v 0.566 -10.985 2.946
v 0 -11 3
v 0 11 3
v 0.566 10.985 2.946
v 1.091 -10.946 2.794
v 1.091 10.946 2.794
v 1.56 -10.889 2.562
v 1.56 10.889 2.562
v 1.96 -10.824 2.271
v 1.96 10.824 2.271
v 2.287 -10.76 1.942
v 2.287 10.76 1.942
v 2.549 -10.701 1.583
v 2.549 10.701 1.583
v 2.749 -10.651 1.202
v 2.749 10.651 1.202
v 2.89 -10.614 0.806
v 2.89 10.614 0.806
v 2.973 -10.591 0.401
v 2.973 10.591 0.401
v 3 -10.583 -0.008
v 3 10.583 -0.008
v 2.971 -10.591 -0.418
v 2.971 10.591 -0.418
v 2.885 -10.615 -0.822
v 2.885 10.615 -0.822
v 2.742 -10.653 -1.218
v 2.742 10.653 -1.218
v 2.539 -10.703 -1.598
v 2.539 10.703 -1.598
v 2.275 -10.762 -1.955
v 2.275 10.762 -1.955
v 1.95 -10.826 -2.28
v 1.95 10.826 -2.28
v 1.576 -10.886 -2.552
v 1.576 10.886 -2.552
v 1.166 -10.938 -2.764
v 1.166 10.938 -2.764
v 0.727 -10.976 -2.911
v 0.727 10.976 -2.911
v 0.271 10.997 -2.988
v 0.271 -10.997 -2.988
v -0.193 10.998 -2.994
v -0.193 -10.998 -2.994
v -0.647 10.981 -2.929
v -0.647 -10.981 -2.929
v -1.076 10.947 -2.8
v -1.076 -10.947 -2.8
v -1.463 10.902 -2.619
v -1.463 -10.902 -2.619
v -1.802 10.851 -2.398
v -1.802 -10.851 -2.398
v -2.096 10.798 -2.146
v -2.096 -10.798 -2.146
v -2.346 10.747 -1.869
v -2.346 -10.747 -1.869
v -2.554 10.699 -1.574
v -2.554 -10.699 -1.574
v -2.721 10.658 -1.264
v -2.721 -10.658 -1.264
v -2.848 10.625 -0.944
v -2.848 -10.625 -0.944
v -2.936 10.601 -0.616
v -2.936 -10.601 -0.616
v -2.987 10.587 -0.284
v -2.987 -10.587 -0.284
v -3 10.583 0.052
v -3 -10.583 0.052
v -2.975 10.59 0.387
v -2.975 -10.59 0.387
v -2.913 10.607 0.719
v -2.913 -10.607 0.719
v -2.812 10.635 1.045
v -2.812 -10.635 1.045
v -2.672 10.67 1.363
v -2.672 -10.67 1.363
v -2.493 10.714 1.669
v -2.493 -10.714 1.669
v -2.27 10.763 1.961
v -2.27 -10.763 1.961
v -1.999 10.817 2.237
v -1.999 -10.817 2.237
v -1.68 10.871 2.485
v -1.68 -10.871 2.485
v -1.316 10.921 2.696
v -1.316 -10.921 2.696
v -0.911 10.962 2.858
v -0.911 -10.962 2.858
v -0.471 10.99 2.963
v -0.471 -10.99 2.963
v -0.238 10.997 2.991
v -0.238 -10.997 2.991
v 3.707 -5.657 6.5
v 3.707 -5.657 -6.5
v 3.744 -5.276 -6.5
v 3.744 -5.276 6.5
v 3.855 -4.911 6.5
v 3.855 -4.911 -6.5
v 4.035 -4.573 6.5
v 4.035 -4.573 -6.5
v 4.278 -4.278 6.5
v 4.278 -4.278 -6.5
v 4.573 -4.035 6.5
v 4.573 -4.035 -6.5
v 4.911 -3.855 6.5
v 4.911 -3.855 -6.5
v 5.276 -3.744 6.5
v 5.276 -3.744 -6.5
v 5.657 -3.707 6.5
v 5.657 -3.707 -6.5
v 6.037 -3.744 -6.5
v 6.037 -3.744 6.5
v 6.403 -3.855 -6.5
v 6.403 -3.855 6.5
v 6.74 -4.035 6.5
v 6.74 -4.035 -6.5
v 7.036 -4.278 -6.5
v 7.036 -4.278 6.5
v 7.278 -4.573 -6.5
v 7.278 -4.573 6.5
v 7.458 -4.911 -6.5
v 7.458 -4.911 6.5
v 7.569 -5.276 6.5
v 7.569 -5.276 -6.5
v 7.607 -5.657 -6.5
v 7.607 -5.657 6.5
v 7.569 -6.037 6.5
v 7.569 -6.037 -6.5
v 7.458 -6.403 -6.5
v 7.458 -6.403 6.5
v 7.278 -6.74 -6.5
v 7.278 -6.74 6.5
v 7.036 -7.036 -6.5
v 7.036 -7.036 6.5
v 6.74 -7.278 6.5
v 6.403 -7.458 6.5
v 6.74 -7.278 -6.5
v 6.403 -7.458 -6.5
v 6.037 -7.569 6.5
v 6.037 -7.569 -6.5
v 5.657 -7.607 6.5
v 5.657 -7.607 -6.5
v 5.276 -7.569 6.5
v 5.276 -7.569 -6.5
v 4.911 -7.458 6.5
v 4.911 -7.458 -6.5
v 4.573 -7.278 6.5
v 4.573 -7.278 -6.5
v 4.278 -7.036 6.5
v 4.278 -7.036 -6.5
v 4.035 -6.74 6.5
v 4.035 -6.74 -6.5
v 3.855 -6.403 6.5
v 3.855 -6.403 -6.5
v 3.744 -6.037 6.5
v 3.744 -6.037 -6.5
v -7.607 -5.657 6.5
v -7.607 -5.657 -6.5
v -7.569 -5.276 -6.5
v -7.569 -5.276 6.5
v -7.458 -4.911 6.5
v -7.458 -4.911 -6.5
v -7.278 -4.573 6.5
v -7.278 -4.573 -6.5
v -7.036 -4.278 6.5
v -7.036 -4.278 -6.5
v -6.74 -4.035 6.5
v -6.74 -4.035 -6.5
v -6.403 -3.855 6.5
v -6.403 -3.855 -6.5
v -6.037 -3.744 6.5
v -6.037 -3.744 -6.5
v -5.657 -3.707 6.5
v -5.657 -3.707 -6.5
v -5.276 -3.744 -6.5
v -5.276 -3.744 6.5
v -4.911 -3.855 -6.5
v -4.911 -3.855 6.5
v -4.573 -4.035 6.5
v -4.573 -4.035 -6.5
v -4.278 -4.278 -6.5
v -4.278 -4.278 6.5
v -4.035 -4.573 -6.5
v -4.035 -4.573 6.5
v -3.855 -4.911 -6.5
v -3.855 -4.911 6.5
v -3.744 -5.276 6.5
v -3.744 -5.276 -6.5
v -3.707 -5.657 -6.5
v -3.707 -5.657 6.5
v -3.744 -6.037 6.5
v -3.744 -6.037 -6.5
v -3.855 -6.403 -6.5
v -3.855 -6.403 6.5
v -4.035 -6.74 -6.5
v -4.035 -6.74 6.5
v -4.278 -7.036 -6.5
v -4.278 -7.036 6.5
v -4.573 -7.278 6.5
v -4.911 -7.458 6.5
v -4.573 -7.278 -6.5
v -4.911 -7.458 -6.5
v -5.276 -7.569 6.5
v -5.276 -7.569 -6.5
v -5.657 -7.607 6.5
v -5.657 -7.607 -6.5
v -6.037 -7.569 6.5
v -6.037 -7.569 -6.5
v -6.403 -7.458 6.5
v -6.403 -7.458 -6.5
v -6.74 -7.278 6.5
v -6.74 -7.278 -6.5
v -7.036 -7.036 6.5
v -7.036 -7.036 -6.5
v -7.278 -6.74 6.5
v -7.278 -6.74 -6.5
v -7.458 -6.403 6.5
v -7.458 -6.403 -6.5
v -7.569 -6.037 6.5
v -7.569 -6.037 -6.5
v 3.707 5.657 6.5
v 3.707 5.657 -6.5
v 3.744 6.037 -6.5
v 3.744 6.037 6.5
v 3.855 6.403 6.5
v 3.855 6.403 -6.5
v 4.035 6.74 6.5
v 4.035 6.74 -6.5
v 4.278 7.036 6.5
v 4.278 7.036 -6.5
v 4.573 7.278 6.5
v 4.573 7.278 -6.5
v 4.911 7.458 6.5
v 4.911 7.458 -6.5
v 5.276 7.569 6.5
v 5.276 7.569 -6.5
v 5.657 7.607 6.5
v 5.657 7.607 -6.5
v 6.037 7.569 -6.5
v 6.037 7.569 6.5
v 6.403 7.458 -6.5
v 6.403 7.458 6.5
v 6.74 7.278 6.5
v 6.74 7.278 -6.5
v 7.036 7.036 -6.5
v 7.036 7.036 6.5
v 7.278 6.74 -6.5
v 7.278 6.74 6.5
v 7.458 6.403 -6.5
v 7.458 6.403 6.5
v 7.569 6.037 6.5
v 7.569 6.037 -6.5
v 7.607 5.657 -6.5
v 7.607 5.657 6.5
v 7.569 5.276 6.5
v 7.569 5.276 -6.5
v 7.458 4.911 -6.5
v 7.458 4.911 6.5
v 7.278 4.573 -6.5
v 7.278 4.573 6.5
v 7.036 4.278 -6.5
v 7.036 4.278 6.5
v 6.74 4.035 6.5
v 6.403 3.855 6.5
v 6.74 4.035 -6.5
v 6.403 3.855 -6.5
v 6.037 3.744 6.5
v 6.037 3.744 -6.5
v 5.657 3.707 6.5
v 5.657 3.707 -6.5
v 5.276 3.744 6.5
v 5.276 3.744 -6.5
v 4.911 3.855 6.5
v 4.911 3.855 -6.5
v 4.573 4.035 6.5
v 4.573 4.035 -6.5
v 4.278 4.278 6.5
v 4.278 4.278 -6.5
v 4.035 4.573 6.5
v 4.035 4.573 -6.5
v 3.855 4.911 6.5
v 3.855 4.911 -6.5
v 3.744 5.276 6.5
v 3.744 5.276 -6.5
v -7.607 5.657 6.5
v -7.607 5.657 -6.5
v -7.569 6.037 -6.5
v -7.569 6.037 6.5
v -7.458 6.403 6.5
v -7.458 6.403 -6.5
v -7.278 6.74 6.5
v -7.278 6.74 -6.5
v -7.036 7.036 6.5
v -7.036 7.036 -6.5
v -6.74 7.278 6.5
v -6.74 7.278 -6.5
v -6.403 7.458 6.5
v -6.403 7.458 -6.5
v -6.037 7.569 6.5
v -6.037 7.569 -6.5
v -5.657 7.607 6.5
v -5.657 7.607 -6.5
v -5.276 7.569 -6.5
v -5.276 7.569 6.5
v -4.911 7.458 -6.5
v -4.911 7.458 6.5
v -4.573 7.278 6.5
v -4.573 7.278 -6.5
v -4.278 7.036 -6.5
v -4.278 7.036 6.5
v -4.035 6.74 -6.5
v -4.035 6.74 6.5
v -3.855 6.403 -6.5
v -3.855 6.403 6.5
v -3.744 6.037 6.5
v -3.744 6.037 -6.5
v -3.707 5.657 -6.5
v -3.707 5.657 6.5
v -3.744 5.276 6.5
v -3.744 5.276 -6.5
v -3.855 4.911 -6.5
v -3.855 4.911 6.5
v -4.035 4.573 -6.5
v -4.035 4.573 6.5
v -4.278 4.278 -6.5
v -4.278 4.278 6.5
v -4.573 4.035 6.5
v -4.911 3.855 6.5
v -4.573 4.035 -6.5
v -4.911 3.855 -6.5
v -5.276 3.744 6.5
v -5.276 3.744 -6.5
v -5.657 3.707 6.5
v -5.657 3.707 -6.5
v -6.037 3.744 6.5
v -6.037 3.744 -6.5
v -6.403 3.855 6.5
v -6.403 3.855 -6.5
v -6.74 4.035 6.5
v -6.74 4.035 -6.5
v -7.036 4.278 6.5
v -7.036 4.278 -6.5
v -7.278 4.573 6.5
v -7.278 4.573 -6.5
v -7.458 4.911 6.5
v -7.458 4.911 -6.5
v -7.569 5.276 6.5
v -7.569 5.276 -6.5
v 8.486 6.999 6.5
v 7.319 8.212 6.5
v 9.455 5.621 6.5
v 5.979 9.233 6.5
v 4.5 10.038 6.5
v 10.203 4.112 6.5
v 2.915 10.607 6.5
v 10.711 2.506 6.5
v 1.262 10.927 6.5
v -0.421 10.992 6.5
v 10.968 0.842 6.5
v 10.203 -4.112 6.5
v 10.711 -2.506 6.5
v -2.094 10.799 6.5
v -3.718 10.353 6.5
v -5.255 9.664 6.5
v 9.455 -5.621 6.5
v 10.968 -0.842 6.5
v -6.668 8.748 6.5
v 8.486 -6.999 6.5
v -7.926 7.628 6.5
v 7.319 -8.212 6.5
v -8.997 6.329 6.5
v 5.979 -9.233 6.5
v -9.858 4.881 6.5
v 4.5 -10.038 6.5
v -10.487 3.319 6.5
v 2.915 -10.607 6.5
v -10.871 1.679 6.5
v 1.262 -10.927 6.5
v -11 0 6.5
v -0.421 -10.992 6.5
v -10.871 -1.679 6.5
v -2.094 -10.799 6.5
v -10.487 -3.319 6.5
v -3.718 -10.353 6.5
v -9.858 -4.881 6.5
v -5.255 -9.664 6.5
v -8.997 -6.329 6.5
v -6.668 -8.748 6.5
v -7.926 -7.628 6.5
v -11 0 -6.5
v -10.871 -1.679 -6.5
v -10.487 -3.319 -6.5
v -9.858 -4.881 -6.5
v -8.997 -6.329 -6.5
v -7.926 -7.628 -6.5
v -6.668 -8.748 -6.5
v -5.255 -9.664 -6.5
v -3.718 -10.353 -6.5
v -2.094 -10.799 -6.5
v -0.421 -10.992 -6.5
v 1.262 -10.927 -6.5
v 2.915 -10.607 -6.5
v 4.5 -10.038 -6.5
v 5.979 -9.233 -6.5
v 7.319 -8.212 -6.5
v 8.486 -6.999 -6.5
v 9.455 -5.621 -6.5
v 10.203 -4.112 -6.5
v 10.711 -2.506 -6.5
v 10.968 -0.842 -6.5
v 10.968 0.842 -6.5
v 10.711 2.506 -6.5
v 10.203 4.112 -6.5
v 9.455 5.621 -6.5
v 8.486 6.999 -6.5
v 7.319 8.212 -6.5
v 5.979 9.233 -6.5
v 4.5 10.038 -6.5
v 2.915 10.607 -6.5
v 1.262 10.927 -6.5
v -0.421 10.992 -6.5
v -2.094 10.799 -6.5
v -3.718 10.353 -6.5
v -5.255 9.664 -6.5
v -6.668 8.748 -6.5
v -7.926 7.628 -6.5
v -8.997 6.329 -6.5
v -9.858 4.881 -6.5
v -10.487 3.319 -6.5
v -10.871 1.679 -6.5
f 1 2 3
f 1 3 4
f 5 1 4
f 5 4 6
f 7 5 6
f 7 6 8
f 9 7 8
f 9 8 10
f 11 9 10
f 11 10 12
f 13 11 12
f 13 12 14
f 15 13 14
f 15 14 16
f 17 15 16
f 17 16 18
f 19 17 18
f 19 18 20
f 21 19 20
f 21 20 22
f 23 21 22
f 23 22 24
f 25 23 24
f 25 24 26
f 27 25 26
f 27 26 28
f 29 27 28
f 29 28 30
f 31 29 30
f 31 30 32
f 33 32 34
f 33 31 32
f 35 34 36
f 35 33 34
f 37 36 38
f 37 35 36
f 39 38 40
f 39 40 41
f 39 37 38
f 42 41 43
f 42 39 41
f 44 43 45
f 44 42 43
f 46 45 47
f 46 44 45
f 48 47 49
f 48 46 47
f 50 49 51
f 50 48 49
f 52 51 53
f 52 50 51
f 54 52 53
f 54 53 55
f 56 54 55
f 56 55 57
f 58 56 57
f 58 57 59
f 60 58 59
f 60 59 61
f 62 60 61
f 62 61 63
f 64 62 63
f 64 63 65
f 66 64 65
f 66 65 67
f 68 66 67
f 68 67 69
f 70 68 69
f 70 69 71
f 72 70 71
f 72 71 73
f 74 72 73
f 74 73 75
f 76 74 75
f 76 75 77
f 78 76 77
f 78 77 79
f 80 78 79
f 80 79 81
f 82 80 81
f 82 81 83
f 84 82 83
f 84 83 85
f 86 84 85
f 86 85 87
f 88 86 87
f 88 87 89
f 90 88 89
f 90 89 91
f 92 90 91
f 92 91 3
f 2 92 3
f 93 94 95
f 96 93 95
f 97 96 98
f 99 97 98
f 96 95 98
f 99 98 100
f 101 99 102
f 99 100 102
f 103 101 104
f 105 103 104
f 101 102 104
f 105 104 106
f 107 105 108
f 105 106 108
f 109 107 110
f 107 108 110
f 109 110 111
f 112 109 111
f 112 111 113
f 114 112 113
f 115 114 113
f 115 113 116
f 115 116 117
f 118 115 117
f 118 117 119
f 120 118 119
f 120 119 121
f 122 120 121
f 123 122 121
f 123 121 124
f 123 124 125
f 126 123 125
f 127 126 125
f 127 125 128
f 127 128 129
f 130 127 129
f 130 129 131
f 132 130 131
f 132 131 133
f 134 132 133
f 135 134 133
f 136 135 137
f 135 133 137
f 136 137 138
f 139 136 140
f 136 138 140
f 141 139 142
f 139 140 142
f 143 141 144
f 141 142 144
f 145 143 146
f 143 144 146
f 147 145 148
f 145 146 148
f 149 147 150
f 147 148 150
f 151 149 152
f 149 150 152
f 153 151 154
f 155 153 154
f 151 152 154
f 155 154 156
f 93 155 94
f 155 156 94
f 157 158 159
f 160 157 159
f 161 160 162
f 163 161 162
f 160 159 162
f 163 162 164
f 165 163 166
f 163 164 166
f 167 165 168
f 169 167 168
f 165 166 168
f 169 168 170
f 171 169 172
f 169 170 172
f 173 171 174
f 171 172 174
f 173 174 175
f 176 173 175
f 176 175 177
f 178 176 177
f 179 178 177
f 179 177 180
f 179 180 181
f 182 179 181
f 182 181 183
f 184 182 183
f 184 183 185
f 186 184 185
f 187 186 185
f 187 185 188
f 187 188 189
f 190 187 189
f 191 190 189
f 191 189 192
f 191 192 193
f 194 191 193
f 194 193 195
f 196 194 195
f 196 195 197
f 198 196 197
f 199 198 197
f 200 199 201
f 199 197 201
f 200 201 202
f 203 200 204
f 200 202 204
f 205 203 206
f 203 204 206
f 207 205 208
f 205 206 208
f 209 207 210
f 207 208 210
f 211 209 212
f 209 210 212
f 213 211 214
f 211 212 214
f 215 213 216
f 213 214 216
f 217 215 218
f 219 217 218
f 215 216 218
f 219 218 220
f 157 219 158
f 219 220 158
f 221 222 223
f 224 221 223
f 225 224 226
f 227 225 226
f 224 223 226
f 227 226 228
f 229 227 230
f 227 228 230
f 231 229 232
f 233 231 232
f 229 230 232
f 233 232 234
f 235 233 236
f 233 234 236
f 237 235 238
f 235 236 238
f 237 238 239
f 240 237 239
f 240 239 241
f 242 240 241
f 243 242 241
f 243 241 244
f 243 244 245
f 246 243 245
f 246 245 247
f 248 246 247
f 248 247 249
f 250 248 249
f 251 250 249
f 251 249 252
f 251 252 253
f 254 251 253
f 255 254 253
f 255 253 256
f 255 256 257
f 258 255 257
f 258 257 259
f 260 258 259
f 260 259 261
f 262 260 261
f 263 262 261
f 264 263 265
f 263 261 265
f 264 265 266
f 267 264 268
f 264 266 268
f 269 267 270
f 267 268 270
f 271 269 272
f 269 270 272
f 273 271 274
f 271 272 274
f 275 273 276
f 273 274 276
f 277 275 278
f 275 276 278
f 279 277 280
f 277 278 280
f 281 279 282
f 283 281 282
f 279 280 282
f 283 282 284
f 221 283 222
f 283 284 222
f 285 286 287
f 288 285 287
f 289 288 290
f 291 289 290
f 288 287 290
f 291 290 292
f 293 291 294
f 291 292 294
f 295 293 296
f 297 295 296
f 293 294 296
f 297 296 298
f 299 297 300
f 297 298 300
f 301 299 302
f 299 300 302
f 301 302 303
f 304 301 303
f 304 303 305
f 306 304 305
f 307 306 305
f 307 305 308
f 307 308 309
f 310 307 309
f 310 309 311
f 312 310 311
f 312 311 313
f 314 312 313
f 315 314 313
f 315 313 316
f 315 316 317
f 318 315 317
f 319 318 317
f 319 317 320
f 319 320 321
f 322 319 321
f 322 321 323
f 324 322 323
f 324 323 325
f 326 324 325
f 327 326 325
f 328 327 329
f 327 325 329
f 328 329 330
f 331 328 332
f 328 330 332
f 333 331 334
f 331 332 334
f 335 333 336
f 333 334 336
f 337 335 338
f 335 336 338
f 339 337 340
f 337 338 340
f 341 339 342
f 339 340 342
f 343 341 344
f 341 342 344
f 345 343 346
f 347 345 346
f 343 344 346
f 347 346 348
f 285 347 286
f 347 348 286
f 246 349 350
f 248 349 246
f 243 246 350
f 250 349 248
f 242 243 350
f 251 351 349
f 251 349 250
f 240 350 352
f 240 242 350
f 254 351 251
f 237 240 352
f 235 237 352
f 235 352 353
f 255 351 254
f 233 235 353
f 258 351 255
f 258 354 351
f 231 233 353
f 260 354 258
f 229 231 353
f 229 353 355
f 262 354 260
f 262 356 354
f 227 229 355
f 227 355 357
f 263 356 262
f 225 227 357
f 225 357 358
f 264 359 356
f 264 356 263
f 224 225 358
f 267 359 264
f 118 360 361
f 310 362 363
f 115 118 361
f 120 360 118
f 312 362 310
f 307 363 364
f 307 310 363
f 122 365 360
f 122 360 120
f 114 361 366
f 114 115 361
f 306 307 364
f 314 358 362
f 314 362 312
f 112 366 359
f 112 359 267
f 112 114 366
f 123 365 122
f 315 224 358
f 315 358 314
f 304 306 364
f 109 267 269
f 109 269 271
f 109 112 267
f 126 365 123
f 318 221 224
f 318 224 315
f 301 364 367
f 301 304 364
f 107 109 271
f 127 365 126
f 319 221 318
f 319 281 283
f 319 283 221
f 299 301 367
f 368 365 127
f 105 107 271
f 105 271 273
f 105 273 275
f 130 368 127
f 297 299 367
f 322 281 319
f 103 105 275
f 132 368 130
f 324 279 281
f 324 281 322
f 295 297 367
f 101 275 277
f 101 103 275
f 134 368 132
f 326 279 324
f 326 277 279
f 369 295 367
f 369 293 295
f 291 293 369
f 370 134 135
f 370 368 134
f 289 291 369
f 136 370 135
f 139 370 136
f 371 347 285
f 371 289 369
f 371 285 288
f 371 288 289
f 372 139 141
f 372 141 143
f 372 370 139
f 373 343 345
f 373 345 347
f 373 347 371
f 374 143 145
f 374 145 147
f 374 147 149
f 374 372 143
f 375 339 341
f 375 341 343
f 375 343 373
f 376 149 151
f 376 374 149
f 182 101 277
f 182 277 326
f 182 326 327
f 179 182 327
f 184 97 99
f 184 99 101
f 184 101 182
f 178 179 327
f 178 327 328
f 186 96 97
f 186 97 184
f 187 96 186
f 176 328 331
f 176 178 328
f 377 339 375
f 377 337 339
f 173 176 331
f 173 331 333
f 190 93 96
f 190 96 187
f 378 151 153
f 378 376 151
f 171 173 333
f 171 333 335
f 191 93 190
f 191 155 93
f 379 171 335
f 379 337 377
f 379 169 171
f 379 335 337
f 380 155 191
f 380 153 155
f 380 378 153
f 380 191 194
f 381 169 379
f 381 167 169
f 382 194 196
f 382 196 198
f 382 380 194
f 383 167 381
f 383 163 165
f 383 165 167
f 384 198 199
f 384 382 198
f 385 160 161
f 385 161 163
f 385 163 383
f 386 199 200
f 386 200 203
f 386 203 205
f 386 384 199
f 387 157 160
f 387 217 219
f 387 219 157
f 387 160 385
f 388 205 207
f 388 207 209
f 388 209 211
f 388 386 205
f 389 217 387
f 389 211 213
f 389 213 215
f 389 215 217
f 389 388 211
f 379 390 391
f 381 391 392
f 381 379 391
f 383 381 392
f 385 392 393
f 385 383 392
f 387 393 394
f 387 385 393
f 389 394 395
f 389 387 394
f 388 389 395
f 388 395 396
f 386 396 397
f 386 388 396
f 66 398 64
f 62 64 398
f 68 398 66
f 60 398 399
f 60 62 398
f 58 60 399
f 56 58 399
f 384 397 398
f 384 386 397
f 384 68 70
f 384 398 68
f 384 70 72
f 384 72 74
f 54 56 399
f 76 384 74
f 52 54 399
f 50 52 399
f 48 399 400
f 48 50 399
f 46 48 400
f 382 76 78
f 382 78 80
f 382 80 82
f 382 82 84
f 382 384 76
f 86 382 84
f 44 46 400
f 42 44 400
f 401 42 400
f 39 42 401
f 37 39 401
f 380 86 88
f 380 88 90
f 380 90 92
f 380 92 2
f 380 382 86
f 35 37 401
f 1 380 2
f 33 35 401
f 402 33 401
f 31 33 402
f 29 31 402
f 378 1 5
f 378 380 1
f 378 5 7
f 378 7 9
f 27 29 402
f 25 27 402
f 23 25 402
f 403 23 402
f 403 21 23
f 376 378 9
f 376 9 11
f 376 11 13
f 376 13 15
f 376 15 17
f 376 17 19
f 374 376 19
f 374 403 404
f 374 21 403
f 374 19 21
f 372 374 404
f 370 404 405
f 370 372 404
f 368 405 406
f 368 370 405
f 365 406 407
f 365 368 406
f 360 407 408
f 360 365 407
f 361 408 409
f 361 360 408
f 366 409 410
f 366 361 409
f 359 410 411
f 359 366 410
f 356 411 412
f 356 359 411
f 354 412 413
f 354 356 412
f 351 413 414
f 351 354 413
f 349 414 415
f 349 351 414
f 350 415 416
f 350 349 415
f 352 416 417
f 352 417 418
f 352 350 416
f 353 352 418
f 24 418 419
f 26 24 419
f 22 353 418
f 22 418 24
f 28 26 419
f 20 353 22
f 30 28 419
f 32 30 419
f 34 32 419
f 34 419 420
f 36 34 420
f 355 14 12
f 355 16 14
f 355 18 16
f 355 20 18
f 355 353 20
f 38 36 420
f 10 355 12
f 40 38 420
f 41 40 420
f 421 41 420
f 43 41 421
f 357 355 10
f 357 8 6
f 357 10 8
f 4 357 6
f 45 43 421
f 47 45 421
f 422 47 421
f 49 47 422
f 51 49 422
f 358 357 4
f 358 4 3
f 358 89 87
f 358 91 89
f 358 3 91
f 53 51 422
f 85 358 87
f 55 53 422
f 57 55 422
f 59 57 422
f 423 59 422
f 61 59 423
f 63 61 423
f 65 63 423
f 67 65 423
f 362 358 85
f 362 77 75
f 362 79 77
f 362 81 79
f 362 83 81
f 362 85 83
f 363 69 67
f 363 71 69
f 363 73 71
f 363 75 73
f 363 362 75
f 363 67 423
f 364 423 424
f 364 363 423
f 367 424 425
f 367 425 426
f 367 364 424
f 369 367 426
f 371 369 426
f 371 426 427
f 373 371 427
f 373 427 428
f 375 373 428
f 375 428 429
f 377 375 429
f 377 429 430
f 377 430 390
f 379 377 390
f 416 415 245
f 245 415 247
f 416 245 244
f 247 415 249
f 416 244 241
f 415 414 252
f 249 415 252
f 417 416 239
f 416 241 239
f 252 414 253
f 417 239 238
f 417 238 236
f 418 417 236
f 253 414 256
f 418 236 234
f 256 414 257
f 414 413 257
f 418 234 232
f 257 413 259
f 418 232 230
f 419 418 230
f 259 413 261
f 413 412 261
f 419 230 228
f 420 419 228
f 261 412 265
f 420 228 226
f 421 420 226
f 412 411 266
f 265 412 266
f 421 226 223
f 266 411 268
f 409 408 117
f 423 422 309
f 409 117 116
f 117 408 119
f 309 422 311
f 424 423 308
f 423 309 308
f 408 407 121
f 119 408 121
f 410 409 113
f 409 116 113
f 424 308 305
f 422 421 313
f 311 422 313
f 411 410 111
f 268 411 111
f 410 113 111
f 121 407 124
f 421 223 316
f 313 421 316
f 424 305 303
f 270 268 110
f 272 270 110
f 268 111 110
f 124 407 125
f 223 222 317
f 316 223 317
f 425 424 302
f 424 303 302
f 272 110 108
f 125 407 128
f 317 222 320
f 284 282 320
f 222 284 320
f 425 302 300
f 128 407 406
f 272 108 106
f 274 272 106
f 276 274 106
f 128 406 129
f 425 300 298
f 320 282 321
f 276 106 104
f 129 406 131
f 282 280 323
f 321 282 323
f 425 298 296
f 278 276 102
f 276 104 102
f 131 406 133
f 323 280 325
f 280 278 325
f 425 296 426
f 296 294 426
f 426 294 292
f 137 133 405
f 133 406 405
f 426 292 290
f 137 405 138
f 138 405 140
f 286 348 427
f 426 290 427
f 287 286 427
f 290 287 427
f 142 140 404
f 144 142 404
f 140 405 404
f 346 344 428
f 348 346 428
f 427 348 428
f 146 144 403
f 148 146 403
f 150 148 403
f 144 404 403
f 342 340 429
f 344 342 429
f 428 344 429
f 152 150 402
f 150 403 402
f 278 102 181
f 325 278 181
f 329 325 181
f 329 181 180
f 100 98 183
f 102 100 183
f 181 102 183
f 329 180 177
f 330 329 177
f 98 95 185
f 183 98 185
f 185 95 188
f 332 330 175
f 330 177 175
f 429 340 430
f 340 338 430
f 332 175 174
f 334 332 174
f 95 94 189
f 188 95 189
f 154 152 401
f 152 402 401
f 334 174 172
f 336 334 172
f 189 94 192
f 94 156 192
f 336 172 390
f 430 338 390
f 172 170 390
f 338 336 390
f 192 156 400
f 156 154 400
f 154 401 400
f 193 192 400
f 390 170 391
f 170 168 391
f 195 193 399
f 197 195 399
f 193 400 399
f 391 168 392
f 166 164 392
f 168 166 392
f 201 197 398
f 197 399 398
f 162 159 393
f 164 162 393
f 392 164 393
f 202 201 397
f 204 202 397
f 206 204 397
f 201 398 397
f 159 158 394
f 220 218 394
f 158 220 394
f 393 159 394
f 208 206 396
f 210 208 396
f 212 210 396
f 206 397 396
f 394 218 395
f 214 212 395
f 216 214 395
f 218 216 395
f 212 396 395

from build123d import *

# Parameters (mm, degrees)
SKETCH1_R               = 11
BOSS_EXTRUDE1_DEPTH     = 6.5
CUT_EXTRUDE1_DEPTH      = 17.8597153
CUT_EXTRUDE1_DEPTH_BACK = 17.8597153
SKETCH2_R               = 3
M3_CLEARANCE_HOLE1_D    = 3.9


with BuildPart() as part:
    # Sketch1 → Boss-Extrude1 (new, symmetric)
    with BuildSketch(Plane.XY):
        with Locations(Location((0, 0, 0), (0, 0, 180))):
            Circle(SKETCH1_R)
    extrude(amount=BOSS_EXTRUDE1_DEPTH, both=True)

    # Sketch2 → Cut-Extrude1 (cut, two sides: drawn at the far end of the back side and taken through both)
    with BuildSketch(Plane(origin=(0, 0, 0), x_dir=(1, 0, 0), z_dir=(0, 1, 0)).offset(-CUT_EXTRUDE1_DEPTH_BACK)):
        with Locations(Location((0, 0, 0), (0, 0, 270))):
            Circle(SKETCH2_R)
    extrude(amount=CUT_EXTRUDE1_DEPTH + CUT_EXTRUDE1_DEPTH_BACK, mode=Mode.SUBTRACT)

    # M3 Clearance Hole1 (through all)
    with Locations(Plane.XY.offset(6.5)):
        with Locations((5.656854249, 5.656854249), (-5.656854249, -5.656854249), (-5.656854249, 5.656854249), (5.656854249, -5.656854249)):
            Hole(M3_CLEARANCE_HOLE1_D / 2)


solid = part.part
